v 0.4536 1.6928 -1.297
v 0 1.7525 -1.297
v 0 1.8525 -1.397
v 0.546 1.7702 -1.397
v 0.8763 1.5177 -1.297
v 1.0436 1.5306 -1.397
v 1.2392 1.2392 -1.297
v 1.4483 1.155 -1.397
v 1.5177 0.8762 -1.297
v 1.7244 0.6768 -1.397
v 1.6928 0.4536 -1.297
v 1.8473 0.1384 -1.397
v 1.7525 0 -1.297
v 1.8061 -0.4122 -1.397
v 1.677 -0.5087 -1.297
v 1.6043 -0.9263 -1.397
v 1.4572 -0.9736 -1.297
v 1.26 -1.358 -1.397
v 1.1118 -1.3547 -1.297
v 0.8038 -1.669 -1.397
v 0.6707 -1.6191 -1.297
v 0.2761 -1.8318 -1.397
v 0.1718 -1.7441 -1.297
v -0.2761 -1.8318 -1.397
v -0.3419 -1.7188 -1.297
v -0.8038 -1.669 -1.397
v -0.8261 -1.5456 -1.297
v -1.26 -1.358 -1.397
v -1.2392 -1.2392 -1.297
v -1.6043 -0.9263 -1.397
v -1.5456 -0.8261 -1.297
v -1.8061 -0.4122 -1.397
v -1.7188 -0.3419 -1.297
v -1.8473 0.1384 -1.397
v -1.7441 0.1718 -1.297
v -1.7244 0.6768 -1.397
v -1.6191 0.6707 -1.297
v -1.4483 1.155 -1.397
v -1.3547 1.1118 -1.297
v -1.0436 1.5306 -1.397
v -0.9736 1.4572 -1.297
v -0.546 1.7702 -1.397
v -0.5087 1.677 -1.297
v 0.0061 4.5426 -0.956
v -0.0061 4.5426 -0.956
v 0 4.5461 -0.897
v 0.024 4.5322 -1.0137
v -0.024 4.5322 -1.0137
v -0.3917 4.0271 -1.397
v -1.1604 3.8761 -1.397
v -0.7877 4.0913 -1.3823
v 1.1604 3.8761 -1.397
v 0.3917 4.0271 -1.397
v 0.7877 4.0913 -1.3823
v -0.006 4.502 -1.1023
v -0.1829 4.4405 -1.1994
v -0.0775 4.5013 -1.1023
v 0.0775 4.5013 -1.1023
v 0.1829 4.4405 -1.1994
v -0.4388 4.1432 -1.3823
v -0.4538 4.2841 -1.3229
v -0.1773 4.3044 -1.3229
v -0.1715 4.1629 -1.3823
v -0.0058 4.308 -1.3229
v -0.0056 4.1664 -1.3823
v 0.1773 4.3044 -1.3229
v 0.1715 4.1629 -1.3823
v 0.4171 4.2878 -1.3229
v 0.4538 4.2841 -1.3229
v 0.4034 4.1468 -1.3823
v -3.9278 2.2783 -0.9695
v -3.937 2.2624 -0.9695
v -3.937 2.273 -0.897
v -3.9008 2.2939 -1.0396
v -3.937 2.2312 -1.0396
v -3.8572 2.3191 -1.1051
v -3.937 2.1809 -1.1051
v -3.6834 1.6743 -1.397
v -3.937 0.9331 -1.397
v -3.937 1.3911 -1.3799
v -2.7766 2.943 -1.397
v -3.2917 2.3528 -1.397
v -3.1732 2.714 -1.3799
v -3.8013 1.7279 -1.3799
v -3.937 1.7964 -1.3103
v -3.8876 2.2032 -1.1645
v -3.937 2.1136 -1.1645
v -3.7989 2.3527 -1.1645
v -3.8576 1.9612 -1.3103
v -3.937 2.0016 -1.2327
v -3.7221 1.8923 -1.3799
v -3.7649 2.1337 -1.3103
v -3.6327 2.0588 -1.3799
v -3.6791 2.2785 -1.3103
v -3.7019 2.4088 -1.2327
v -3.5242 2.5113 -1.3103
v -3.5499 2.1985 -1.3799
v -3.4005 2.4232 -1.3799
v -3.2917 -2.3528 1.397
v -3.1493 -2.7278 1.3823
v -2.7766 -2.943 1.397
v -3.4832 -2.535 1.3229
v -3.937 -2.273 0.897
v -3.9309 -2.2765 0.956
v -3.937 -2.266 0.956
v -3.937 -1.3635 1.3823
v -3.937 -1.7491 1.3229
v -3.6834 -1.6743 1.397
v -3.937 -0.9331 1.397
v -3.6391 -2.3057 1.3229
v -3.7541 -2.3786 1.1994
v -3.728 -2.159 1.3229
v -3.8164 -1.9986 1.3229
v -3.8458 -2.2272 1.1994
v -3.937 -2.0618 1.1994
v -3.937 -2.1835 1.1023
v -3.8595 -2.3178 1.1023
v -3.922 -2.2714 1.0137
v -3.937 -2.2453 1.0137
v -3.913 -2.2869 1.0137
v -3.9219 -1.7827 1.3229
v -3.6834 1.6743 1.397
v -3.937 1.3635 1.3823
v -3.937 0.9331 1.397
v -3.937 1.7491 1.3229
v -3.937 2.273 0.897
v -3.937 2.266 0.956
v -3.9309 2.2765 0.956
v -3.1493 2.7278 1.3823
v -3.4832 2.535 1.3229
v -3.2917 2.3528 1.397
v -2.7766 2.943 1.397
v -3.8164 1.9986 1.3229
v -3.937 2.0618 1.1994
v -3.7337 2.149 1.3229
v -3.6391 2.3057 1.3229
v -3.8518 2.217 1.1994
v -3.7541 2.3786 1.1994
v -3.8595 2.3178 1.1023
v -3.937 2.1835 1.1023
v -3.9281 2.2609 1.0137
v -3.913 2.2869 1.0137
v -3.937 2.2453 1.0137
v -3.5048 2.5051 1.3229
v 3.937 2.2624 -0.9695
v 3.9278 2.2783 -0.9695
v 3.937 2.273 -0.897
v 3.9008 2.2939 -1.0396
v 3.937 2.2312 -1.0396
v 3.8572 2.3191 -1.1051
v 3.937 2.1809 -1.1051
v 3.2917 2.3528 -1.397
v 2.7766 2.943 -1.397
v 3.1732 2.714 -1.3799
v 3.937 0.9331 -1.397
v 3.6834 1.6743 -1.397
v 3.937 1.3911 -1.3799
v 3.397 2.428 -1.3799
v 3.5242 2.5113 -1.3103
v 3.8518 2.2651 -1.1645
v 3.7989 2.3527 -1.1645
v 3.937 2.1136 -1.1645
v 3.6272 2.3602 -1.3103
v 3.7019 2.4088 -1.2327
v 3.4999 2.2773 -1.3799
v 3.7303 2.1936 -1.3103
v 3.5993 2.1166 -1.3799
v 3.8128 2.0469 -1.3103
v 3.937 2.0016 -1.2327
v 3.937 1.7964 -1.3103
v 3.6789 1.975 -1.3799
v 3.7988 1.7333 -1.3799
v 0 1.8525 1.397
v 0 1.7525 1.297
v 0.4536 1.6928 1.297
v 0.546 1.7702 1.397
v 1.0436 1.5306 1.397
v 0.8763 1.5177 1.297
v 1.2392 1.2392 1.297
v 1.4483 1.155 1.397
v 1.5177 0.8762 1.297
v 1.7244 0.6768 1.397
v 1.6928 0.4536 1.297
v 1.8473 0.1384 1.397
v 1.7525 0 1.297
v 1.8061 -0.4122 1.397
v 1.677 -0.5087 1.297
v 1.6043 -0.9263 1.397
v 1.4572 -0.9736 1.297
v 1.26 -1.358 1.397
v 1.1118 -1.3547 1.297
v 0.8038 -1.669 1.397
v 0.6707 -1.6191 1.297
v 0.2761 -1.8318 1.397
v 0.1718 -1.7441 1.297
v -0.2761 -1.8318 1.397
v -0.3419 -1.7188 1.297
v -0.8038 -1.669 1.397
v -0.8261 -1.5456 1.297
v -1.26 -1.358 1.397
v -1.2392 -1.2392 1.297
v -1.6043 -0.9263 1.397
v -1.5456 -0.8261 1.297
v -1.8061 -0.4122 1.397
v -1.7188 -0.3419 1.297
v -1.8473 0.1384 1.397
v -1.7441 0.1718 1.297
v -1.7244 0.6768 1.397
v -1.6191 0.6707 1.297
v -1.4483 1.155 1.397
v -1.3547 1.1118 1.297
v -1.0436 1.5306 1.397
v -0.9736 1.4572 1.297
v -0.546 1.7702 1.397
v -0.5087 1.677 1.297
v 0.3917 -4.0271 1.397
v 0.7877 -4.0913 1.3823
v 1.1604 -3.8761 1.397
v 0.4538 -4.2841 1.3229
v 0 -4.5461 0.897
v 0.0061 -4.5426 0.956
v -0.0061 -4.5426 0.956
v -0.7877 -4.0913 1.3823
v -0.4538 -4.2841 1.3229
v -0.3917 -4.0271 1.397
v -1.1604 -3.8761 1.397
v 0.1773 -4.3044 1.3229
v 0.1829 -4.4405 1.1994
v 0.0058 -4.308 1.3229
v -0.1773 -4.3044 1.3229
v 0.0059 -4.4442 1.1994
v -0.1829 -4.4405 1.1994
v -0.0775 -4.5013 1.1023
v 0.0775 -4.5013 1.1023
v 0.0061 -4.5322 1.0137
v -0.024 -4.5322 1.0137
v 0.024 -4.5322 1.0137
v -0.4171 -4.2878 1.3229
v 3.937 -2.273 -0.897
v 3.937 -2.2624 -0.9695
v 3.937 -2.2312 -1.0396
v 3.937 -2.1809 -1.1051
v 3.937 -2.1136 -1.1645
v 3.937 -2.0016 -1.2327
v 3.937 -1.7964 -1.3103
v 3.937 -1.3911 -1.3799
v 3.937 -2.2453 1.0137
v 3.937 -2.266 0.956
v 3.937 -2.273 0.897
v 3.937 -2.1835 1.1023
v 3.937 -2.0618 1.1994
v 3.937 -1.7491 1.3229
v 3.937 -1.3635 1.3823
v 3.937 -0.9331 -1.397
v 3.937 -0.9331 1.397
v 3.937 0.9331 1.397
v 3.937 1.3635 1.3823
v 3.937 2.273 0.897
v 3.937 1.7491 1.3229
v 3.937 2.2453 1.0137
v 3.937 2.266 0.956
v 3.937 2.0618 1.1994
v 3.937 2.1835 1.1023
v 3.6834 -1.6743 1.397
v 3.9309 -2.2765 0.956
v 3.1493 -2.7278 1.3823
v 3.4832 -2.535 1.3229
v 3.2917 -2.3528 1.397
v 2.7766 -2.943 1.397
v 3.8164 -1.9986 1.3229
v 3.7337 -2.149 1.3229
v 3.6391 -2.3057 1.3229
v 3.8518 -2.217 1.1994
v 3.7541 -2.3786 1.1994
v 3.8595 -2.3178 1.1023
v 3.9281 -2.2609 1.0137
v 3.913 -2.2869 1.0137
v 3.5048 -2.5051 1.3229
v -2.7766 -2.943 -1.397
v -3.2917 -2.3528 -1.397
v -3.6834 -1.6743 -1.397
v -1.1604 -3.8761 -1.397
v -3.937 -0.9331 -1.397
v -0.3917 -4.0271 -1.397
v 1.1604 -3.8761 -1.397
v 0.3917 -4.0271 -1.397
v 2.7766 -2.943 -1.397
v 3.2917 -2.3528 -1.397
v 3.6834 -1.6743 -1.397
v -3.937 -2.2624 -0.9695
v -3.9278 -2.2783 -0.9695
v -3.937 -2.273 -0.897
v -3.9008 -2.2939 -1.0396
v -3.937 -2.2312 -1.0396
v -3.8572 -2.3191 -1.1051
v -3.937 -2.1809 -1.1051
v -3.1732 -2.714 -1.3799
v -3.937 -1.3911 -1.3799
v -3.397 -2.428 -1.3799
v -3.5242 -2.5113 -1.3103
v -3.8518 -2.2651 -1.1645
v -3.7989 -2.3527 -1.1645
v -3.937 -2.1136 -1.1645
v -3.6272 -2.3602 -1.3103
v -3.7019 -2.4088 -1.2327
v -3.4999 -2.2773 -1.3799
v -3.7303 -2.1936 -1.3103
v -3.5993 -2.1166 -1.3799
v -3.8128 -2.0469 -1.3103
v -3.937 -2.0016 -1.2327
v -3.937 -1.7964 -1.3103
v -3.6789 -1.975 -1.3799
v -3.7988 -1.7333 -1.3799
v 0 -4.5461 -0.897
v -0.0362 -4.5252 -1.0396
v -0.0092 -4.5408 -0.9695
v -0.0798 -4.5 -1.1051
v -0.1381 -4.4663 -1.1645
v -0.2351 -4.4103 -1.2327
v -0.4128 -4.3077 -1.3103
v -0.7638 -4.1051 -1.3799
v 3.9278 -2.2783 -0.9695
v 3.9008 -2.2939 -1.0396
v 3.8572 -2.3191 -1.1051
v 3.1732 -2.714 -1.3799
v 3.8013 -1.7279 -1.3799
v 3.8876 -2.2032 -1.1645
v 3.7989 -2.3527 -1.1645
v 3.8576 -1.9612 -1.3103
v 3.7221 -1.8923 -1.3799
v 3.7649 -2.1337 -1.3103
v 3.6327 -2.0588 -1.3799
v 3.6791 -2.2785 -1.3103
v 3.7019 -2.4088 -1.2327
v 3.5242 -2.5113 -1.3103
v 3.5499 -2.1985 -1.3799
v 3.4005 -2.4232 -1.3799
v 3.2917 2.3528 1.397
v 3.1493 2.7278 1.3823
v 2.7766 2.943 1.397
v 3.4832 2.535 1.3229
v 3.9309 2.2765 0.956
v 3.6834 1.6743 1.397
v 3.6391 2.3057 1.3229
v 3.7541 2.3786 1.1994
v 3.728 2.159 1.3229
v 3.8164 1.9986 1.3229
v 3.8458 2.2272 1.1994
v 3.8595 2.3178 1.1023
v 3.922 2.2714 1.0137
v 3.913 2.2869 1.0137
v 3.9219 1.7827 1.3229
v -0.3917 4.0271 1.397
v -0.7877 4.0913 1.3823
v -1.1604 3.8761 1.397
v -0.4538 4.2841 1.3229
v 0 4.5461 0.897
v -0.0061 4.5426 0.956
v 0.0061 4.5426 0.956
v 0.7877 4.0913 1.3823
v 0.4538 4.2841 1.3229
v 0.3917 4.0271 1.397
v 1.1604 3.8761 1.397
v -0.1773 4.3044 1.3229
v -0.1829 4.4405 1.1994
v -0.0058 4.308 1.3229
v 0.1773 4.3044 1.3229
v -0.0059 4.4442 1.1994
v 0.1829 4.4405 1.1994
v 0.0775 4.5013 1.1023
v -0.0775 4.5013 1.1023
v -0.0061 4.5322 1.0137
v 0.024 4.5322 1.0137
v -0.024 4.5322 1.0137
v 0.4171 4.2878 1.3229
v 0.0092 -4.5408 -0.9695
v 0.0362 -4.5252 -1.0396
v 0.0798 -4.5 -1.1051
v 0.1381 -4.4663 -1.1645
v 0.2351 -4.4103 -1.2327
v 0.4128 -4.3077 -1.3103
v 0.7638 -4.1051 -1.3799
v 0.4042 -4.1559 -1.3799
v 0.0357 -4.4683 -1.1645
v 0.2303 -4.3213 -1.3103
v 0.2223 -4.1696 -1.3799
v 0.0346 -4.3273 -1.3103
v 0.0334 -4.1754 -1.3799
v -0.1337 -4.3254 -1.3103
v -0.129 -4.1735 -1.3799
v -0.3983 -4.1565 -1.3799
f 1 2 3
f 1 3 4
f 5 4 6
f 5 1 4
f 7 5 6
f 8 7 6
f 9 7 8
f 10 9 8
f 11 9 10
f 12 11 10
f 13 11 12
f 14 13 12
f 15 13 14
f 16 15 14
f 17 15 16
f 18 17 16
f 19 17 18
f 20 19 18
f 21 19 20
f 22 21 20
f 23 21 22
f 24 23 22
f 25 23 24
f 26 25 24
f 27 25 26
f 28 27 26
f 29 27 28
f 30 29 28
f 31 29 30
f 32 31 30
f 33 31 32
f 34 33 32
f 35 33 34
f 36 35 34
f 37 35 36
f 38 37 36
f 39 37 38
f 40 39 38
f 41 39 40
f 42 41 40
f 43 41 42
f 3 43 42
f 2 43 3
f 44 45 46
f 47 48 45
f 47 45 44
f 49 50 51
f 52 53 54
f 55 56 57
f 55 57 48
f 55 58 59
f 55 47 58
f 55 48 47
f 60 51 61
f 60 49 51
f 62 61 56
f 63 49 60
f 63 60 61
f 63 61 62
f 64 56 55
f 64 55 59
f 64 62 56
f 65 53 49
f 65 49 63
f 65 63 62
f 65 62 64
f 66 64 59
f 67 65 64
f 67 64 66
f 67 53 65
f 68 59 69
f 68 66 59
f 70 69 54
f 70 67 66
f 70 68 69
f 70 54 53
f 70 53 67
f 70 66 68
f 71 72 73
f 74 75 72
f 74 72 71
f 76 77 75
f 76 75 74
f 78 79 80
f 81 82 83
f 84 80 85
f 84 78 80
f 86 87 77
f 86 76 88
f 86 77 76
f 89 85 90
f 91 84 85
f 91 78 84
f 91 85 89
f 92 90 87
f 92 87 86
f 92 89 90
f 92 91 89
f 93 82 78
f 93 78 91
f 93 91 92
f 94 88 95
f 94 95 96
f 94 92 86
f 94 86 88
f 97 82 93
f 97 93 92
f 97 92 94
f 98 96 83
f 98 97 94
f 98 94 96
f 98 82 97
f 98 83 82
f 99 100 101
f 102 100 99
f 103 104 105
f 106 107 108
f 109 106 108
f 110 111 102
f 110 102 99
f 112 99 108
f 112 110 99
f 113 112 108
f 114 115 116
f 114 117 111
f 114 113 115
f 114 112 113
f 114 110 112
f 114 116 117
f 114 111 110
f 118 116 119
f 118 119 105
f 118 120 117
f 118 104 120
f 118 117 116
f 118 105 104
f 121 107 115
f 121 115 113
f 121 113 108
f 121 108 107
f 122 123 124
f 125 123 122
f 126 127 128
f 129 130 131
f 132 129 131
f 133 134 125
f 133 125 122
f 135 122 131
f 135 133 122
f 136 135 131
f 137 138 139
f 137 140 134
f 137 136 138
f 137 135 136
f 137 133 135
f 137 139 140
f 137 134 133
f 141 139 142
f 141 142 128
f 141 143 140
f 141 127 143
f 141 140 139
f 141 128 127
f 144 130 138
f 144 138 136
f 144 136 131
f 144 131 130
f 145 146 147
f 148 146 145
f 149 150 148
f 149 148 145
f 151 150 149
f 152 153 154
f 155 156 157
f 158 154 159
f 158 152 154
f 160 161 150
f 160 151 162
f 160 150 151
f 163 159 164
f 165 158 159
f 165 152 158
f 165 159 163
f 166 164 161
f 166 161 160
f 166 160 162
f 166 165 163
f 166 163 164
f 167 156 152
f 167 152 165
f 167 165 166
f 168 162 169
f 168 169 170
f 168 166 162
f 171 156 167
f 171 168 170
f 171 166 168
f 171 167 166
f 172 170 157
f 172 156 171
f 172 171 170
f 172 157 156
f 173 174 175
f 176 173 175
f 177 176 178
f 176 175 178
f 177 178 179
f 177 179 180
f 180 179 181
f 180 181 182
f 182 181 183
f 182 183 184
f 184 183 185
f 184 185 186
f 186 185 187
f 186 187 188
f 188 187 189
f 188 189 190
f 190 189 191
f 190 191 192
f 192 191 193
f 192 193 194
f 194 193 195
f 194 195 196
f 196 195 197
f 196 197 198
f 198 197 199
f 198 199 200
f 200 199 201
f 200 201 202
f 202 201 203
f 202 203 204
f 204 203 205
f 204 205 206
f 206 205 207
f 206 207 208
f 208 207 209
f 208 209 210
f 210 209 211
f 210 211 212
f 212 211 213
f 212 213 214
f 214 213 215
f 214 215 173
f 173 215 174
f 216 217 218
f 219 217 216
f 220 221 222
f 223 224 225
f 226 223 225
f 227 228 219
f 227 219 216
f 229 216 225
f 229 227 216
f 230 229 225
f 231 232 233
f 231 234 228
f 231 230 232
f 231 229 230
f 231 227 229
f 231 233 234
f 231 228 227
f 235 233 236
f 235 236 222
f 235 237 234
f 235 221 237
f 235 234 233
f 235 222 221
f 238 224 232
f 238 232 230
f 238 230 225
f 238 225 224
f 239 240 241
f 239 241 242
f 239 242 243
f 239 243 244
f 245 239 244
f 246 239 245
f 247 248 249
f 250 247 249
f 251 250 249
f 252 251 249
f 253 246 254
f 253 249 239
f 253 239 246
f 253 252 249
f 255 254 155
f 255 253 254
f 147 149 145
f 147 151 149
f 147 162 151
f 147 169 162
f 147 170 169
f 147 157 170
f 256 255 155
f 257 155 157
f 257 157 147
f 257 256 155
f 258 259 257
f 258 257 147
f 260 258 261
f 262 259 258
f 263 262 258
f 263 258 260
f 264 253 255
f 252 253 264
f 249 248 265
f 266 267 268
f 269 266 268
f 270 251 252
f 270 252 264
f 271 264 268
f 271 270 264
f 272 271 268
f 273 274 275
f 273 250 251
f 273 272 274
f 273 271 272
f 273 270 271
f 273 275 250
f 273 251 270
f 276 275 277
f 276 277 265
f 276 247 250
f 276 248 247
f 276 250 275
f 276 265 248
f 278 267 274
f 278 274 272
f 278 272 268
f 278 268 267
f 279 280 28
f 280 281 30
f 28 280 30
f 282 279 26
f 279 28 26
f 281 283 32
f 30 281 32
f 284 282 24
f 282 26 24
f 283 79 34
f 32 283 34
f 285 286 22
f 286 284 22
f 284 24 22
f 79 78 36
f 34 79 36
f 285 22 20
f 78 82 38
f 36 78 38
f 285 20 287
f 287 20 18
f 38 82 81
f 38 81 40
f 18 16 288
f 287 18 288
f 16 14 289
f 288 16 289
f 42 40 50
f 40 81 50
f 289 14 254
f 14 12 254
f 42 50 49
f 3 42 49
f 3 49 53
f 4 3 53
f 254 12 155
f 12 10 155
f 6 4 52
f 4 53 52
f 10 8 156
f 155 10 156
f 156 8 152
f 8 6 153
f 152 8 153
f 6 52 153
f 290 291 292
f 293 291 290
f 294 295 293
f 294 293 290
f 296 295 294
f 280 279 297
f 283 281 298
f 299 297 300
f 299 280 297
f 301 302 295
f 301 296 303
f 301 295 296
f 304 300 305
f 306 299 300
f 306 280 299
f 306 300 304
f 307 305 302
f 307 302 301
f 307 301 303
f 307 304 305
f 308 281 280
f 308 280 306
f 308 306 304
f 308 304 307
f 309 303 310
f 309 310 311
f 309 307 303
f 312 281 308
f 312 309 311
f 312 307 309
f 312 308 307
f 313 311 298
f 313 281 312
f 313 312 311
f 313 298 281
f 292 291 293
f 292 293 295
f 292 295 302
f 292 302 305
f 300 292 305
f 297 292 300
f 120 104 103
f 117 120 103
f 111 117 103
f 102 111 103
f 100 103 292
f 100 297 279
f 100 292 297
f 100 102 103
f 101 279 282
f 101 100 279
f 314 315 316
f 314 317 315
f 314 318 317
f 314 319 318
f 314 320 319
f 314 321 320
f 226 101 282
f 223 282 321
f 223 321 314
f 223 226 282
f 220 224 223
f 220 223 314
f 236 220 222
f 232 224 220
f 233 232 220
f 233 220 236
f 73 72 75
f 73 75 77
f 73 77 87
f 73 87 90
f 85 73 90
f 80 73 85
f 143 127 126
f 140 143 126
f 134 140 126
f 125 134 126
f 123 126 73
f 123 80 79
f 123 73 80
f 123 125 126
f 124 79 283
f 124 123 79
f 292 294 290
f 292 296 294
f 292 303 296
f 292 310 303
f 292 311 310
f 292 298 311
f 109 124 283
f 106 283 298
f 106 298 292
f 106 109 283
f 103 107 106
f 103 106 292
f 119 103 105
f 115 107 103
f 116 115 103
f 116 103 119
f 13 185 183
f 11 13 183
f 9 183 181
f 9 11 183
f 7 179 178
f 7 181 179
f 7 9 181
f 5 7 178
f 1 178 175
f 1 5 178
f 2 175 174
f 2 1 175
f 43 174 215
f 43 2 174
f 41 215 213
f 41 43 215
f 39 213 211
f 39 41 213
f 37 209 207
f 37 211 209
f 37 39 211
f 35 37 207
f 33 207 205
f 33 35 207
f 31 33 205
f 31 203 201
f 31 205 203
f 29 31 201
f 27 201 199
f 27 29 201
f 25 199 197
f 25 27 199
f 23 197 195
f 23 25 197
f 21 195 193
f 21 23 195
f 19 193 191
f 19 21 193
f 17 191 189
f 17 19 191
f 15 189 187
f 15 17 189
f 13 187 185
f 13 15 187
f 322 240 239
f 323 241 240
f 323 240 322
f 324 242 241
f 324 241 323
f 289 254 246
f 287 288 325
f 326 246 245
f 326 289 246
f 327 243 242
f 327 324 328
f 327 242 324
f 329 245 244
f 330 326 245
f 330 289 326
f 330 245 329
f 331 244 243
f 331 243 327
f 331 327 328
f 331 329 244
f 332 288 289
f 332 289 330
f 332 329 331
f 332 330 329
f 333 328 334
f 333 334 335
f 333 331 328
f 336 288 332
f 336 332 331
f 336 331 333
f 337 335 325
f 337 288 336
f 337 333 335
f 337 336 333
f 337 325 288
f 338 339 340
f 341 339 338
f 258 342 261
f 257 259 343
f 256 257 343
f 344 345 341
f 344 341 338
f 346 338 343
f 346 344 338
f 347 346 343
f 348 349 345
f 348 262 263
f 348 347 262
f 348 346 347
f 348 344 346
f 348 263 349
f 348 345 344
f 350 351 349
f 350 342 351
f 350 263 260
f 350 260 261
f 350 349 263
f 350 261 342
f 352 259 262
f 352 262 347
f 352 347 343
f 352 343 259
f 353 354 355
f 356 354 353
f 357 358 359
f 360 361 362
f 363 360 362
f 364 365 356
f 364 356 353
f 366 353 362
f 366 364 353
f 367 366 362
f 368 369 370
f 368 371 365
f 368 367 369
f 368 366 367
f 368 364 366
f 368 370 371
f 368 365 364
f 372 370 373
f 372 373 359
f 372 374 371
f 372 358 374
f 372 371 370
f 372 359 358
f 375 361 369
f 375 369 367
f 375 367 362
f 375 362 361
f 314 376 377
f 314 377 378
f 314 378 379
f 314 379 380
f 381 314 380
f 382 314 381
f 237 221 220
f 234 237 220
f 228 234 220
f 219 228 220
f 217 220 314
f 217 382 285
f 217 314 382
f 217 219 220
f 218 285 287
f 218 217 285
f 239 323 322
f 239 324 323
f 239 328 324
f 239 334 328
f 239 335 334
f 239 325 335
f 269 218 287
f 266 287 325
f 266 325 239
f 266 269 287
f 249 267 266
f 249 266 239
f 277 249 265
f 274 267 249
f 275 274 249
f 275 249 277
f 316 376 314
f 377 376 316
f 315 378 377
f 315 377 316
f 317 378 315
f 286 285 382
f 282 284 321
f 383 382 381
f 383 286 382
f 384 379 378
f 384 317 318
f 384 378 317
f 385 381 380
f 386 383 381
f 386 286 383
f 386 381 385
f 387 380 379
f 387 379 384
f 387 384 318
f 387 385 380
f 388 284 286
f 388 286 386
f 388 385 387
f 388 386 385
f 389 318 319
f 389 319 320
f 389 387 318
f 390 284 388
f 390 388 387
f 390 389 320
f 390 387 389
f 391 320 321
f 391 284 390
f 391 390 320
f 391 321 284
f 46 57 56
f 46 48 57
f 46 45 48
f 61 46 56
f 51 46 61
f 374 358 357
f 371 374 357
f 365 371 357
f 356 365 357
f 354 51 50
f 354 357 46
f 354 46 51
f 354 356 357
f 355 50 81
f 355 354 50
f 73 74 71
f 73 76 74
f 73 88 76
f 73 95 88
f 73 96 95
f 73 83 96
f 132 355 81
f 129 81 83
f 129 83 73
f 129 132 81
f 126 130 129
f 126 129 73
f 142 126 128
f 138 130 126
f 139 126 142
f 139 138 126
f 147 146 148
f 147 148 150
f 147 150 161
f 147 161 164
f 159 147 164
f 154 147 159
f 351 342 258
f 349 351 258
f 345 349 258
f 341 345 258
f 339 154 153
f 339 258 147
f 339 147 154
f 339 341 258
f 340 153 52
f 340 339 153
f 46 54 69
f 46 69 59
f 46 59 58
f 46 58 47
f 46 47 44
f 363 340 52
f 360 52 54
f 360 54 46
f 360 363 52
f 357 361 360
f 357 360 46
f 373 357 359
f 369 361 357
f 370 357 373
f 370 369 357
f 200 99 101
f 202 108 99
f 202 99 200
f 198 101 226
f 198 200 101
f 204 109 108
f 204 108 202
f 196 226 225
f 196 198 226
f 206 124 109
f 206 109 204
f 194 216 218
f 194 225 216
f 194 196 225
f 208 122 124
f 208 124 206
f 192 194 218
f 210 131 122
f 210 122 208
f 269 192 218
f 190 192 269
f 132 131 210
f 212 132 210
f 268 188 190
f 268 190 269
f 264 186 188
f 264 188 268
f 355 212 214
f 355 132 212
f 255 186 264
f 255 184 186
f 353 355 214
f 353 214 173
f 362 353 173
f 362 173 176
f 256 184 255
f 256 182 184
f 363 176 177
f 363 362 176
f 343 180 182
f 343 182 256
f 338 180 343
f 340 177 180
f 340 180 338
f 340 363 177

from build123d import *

# Parameters (mm, degrees)
SKETCH1_R          = 1.7525
BASE_EXTRUDE_DEPTH = 1.397


with BuildPart() as part:
    # Sketch1 → Base-Extrude (new body, symmetric)
    with BuildSketch(Plane.XY):
        Polygon((0, 4.54605602), (-3.937, 2.27302801), (-3.937, -2.27302801), (0, -4.54605602), (3.937, -2.27302801), (3.937, 2.27302801), align=None)
        Circle(SKETCH1_R, mode=Mode.SUBTRACT)
    extrude(amount=BASE_EXTRUDE_DEPTH, both=True)

    # Sketch2 → DetailCut (revolve, cut)
    with BuildSketch(Plane(origin=(0, 0, 0), x_dir=(0, 0, -1), z_dir=(1, 0, 0))):
        Polygon((-1.397, 1.7525), (-1.397, 1.8525), (-1.297, 1.7525), align=None)
        with BuildLine():
            Line((-1.397, 4.54605602), (-1.397, 4.04605602))
            ThreePointArc((-1.397, 4.04605602), (-1.250553391, 4.39960941), (-0.897, 4.54605602))
            Line((-0.897, 4.54605602), (-1.397, 4.54605602))
        make_face()
        with BuildLine():
            Line((1.397, 4.54605602), (0.897, 4.54605602))
            ThreePointArc((0.897, 4.54605602), (1.250553391, 4.39960941), (1.397, 4.04605602))
            Line((1.397, 4.04605602), (1.397, 4.54605602))
        make_face()
        Polygon((1.297, 1.7525), (1.397, 1.7525), (1.397, 1.8525), align=None)
    revolve(axis=Axis((0, 0, 0), (0, 0, -1)), mode=Mode.SUBTRACT)


solid = part.part
